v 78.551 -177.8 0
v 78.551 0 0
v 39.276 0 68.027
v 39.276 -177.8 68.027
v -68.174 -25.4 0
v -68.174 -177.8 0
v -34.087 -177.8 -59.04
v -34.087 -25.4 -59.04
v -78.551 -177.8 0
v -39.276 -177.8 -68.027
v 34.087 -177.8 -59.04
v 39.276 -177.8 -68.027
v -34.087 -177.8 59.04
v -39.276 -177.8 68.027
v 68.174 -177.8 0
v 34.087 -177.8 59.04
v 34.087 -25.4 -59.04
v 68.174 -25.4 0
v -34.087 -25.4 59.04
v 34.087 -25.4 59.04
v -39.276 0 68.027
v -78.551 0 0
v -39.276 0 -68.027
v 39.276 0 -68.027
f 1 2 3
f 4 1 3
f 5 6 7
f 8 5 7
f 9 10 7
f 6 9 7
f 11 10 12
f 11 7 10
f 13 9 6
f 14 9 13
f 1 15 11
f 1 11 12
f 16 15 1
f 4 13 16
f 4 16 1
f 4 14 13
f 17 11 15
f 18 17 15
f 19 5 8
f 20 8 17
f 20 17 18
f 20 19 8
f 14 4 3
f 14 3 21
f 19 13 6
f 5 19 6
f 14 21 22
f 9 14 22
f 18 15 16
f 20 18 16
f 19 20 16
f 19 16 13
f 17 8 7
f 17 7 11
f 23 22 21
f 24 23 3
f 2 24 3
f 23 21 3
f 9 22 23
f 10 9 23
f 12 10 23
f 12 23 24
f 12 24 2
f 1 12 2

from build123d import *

# Parameters (mm, degrees)
F1_DEPTH = 177.8
F3_DEPTH = 152.4


with BuildPart() as f1:
    # F0 (on Front) → F1 (new body)
    with BuildSketch(Plane.XZ):
        Polygon((39.275538, 68.027228), (-39.275538, 68.027228), (-78.551077, 0), (-39.275538, -68.027228), (39.275538, -68.027228), (78.551077, 0), align=None)
    extrude(amount=F1_DEPTH)

    # F2 (on face) → F3 (cut)
    with BuildSketch(Plane.XZ.offset(177.8)):
        Polygon((34.086841, 59.04014), (-34.086841, 59.04014), (-68.173682, 0), (-34.086841, -59.04014), (34.086841, -59.04014), (68.173682, 0), align=None)
    extrude(amount=-F3_DEPTH, mode=Mode.SUBTRACT)


solid = f1.part
